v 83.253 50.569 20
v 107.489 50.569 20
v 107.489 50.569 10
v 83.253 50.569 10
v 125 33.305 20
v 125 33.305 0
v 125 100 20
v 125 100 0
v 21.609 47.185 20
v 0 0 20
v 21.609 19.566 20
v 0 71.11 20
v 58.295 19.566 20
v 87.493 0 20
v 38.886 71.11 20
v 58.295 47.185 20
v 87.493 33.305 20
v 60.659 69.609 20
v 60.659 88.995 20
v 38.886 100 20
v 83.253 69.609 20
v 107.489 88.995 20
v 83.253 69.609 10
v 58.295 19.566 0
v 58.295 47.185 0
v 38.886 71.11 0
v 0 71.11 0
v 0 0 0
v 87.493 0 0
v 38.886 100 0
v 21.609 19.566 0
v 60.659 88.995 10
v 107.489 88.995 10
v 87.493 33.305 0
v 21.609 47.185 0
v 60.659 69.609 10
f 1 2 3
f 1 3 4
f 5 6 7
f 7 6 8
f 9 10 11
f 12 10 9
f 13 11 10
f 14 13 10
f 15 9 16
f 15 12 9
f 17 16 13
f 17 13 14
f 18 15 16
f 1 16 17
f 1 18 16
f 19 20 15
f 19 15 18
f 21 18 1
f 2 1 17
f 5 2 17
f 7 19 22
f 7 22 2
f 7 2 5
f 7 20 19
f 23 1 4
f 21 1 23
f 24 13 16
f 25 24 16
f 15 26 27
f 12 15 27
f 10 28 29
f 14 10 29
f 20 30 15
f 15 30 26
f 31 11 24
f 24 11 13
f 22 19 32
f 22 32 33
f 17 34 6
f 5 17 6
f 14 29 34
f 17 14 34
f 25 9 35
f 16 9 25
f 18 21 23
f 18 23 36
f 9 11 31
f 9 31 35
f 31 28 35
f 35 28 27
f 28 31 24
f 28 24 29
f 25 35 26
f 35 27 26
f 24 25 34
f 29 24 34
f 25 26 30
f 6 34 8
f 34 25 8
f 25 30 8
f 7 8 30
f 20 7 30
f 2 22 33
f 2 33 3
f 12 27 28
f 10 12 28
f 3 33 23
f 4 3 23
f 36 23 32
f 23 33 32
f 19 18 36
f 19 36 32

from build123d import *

# Parameters (mm, degrees)
EXTRUDE1_DEPTH     = 20
SKETCH2_W          = 36.686074526
SKETCH2_H          = 27.619463242
CUT_EXTRUDE1_DEPTH = 20
CUT_EXTRUDE2_DEPTH = 10


with BuildPart() as part:
    # Sketch1 → Extrude1 (new body)
    with BuildSketch(Plane.XY):
        Polygon((0, 0), (87.492525773, 0), (87.492525773, 33.304768041), (125, 33.304768041), (125, 100), (38.88556701, 100), (38.88556701, 71.110180412), (0, 71.110180412), align=None)
    extrude(amount=EXTRUDE1_DEPTH)

    # Sketch2 → Cut-Extrude1 (cut)
    with BuildSketch(Plane.XY.offset(20)):
        with Locations((39.952253424, 33.375570886)):
            Rectangle(SKETCH2_W, SKETCH2_H)
    extrude(amount=-CUT_EXTRUDE1_DEPTH, mode=Mode.SUBTRACT)

    # Sketch3 → Cut-Extrude2 (cut)
    with BuildSketch(Plane.XY.offset(20)):
        Polygon((60.658966885, 88.995285907), (107.488557574, 88.995285907), (107.488557574, 50.5688125), (83.253213497, 50.5688125), (83.253213497, 69.608647213), (60.658966885, 69.608647213), align=None)
    extrude(amount=-CUT_EXTRUDE2_DEPTH, mode=Mode.SUBTRACT)


solid = part.part
